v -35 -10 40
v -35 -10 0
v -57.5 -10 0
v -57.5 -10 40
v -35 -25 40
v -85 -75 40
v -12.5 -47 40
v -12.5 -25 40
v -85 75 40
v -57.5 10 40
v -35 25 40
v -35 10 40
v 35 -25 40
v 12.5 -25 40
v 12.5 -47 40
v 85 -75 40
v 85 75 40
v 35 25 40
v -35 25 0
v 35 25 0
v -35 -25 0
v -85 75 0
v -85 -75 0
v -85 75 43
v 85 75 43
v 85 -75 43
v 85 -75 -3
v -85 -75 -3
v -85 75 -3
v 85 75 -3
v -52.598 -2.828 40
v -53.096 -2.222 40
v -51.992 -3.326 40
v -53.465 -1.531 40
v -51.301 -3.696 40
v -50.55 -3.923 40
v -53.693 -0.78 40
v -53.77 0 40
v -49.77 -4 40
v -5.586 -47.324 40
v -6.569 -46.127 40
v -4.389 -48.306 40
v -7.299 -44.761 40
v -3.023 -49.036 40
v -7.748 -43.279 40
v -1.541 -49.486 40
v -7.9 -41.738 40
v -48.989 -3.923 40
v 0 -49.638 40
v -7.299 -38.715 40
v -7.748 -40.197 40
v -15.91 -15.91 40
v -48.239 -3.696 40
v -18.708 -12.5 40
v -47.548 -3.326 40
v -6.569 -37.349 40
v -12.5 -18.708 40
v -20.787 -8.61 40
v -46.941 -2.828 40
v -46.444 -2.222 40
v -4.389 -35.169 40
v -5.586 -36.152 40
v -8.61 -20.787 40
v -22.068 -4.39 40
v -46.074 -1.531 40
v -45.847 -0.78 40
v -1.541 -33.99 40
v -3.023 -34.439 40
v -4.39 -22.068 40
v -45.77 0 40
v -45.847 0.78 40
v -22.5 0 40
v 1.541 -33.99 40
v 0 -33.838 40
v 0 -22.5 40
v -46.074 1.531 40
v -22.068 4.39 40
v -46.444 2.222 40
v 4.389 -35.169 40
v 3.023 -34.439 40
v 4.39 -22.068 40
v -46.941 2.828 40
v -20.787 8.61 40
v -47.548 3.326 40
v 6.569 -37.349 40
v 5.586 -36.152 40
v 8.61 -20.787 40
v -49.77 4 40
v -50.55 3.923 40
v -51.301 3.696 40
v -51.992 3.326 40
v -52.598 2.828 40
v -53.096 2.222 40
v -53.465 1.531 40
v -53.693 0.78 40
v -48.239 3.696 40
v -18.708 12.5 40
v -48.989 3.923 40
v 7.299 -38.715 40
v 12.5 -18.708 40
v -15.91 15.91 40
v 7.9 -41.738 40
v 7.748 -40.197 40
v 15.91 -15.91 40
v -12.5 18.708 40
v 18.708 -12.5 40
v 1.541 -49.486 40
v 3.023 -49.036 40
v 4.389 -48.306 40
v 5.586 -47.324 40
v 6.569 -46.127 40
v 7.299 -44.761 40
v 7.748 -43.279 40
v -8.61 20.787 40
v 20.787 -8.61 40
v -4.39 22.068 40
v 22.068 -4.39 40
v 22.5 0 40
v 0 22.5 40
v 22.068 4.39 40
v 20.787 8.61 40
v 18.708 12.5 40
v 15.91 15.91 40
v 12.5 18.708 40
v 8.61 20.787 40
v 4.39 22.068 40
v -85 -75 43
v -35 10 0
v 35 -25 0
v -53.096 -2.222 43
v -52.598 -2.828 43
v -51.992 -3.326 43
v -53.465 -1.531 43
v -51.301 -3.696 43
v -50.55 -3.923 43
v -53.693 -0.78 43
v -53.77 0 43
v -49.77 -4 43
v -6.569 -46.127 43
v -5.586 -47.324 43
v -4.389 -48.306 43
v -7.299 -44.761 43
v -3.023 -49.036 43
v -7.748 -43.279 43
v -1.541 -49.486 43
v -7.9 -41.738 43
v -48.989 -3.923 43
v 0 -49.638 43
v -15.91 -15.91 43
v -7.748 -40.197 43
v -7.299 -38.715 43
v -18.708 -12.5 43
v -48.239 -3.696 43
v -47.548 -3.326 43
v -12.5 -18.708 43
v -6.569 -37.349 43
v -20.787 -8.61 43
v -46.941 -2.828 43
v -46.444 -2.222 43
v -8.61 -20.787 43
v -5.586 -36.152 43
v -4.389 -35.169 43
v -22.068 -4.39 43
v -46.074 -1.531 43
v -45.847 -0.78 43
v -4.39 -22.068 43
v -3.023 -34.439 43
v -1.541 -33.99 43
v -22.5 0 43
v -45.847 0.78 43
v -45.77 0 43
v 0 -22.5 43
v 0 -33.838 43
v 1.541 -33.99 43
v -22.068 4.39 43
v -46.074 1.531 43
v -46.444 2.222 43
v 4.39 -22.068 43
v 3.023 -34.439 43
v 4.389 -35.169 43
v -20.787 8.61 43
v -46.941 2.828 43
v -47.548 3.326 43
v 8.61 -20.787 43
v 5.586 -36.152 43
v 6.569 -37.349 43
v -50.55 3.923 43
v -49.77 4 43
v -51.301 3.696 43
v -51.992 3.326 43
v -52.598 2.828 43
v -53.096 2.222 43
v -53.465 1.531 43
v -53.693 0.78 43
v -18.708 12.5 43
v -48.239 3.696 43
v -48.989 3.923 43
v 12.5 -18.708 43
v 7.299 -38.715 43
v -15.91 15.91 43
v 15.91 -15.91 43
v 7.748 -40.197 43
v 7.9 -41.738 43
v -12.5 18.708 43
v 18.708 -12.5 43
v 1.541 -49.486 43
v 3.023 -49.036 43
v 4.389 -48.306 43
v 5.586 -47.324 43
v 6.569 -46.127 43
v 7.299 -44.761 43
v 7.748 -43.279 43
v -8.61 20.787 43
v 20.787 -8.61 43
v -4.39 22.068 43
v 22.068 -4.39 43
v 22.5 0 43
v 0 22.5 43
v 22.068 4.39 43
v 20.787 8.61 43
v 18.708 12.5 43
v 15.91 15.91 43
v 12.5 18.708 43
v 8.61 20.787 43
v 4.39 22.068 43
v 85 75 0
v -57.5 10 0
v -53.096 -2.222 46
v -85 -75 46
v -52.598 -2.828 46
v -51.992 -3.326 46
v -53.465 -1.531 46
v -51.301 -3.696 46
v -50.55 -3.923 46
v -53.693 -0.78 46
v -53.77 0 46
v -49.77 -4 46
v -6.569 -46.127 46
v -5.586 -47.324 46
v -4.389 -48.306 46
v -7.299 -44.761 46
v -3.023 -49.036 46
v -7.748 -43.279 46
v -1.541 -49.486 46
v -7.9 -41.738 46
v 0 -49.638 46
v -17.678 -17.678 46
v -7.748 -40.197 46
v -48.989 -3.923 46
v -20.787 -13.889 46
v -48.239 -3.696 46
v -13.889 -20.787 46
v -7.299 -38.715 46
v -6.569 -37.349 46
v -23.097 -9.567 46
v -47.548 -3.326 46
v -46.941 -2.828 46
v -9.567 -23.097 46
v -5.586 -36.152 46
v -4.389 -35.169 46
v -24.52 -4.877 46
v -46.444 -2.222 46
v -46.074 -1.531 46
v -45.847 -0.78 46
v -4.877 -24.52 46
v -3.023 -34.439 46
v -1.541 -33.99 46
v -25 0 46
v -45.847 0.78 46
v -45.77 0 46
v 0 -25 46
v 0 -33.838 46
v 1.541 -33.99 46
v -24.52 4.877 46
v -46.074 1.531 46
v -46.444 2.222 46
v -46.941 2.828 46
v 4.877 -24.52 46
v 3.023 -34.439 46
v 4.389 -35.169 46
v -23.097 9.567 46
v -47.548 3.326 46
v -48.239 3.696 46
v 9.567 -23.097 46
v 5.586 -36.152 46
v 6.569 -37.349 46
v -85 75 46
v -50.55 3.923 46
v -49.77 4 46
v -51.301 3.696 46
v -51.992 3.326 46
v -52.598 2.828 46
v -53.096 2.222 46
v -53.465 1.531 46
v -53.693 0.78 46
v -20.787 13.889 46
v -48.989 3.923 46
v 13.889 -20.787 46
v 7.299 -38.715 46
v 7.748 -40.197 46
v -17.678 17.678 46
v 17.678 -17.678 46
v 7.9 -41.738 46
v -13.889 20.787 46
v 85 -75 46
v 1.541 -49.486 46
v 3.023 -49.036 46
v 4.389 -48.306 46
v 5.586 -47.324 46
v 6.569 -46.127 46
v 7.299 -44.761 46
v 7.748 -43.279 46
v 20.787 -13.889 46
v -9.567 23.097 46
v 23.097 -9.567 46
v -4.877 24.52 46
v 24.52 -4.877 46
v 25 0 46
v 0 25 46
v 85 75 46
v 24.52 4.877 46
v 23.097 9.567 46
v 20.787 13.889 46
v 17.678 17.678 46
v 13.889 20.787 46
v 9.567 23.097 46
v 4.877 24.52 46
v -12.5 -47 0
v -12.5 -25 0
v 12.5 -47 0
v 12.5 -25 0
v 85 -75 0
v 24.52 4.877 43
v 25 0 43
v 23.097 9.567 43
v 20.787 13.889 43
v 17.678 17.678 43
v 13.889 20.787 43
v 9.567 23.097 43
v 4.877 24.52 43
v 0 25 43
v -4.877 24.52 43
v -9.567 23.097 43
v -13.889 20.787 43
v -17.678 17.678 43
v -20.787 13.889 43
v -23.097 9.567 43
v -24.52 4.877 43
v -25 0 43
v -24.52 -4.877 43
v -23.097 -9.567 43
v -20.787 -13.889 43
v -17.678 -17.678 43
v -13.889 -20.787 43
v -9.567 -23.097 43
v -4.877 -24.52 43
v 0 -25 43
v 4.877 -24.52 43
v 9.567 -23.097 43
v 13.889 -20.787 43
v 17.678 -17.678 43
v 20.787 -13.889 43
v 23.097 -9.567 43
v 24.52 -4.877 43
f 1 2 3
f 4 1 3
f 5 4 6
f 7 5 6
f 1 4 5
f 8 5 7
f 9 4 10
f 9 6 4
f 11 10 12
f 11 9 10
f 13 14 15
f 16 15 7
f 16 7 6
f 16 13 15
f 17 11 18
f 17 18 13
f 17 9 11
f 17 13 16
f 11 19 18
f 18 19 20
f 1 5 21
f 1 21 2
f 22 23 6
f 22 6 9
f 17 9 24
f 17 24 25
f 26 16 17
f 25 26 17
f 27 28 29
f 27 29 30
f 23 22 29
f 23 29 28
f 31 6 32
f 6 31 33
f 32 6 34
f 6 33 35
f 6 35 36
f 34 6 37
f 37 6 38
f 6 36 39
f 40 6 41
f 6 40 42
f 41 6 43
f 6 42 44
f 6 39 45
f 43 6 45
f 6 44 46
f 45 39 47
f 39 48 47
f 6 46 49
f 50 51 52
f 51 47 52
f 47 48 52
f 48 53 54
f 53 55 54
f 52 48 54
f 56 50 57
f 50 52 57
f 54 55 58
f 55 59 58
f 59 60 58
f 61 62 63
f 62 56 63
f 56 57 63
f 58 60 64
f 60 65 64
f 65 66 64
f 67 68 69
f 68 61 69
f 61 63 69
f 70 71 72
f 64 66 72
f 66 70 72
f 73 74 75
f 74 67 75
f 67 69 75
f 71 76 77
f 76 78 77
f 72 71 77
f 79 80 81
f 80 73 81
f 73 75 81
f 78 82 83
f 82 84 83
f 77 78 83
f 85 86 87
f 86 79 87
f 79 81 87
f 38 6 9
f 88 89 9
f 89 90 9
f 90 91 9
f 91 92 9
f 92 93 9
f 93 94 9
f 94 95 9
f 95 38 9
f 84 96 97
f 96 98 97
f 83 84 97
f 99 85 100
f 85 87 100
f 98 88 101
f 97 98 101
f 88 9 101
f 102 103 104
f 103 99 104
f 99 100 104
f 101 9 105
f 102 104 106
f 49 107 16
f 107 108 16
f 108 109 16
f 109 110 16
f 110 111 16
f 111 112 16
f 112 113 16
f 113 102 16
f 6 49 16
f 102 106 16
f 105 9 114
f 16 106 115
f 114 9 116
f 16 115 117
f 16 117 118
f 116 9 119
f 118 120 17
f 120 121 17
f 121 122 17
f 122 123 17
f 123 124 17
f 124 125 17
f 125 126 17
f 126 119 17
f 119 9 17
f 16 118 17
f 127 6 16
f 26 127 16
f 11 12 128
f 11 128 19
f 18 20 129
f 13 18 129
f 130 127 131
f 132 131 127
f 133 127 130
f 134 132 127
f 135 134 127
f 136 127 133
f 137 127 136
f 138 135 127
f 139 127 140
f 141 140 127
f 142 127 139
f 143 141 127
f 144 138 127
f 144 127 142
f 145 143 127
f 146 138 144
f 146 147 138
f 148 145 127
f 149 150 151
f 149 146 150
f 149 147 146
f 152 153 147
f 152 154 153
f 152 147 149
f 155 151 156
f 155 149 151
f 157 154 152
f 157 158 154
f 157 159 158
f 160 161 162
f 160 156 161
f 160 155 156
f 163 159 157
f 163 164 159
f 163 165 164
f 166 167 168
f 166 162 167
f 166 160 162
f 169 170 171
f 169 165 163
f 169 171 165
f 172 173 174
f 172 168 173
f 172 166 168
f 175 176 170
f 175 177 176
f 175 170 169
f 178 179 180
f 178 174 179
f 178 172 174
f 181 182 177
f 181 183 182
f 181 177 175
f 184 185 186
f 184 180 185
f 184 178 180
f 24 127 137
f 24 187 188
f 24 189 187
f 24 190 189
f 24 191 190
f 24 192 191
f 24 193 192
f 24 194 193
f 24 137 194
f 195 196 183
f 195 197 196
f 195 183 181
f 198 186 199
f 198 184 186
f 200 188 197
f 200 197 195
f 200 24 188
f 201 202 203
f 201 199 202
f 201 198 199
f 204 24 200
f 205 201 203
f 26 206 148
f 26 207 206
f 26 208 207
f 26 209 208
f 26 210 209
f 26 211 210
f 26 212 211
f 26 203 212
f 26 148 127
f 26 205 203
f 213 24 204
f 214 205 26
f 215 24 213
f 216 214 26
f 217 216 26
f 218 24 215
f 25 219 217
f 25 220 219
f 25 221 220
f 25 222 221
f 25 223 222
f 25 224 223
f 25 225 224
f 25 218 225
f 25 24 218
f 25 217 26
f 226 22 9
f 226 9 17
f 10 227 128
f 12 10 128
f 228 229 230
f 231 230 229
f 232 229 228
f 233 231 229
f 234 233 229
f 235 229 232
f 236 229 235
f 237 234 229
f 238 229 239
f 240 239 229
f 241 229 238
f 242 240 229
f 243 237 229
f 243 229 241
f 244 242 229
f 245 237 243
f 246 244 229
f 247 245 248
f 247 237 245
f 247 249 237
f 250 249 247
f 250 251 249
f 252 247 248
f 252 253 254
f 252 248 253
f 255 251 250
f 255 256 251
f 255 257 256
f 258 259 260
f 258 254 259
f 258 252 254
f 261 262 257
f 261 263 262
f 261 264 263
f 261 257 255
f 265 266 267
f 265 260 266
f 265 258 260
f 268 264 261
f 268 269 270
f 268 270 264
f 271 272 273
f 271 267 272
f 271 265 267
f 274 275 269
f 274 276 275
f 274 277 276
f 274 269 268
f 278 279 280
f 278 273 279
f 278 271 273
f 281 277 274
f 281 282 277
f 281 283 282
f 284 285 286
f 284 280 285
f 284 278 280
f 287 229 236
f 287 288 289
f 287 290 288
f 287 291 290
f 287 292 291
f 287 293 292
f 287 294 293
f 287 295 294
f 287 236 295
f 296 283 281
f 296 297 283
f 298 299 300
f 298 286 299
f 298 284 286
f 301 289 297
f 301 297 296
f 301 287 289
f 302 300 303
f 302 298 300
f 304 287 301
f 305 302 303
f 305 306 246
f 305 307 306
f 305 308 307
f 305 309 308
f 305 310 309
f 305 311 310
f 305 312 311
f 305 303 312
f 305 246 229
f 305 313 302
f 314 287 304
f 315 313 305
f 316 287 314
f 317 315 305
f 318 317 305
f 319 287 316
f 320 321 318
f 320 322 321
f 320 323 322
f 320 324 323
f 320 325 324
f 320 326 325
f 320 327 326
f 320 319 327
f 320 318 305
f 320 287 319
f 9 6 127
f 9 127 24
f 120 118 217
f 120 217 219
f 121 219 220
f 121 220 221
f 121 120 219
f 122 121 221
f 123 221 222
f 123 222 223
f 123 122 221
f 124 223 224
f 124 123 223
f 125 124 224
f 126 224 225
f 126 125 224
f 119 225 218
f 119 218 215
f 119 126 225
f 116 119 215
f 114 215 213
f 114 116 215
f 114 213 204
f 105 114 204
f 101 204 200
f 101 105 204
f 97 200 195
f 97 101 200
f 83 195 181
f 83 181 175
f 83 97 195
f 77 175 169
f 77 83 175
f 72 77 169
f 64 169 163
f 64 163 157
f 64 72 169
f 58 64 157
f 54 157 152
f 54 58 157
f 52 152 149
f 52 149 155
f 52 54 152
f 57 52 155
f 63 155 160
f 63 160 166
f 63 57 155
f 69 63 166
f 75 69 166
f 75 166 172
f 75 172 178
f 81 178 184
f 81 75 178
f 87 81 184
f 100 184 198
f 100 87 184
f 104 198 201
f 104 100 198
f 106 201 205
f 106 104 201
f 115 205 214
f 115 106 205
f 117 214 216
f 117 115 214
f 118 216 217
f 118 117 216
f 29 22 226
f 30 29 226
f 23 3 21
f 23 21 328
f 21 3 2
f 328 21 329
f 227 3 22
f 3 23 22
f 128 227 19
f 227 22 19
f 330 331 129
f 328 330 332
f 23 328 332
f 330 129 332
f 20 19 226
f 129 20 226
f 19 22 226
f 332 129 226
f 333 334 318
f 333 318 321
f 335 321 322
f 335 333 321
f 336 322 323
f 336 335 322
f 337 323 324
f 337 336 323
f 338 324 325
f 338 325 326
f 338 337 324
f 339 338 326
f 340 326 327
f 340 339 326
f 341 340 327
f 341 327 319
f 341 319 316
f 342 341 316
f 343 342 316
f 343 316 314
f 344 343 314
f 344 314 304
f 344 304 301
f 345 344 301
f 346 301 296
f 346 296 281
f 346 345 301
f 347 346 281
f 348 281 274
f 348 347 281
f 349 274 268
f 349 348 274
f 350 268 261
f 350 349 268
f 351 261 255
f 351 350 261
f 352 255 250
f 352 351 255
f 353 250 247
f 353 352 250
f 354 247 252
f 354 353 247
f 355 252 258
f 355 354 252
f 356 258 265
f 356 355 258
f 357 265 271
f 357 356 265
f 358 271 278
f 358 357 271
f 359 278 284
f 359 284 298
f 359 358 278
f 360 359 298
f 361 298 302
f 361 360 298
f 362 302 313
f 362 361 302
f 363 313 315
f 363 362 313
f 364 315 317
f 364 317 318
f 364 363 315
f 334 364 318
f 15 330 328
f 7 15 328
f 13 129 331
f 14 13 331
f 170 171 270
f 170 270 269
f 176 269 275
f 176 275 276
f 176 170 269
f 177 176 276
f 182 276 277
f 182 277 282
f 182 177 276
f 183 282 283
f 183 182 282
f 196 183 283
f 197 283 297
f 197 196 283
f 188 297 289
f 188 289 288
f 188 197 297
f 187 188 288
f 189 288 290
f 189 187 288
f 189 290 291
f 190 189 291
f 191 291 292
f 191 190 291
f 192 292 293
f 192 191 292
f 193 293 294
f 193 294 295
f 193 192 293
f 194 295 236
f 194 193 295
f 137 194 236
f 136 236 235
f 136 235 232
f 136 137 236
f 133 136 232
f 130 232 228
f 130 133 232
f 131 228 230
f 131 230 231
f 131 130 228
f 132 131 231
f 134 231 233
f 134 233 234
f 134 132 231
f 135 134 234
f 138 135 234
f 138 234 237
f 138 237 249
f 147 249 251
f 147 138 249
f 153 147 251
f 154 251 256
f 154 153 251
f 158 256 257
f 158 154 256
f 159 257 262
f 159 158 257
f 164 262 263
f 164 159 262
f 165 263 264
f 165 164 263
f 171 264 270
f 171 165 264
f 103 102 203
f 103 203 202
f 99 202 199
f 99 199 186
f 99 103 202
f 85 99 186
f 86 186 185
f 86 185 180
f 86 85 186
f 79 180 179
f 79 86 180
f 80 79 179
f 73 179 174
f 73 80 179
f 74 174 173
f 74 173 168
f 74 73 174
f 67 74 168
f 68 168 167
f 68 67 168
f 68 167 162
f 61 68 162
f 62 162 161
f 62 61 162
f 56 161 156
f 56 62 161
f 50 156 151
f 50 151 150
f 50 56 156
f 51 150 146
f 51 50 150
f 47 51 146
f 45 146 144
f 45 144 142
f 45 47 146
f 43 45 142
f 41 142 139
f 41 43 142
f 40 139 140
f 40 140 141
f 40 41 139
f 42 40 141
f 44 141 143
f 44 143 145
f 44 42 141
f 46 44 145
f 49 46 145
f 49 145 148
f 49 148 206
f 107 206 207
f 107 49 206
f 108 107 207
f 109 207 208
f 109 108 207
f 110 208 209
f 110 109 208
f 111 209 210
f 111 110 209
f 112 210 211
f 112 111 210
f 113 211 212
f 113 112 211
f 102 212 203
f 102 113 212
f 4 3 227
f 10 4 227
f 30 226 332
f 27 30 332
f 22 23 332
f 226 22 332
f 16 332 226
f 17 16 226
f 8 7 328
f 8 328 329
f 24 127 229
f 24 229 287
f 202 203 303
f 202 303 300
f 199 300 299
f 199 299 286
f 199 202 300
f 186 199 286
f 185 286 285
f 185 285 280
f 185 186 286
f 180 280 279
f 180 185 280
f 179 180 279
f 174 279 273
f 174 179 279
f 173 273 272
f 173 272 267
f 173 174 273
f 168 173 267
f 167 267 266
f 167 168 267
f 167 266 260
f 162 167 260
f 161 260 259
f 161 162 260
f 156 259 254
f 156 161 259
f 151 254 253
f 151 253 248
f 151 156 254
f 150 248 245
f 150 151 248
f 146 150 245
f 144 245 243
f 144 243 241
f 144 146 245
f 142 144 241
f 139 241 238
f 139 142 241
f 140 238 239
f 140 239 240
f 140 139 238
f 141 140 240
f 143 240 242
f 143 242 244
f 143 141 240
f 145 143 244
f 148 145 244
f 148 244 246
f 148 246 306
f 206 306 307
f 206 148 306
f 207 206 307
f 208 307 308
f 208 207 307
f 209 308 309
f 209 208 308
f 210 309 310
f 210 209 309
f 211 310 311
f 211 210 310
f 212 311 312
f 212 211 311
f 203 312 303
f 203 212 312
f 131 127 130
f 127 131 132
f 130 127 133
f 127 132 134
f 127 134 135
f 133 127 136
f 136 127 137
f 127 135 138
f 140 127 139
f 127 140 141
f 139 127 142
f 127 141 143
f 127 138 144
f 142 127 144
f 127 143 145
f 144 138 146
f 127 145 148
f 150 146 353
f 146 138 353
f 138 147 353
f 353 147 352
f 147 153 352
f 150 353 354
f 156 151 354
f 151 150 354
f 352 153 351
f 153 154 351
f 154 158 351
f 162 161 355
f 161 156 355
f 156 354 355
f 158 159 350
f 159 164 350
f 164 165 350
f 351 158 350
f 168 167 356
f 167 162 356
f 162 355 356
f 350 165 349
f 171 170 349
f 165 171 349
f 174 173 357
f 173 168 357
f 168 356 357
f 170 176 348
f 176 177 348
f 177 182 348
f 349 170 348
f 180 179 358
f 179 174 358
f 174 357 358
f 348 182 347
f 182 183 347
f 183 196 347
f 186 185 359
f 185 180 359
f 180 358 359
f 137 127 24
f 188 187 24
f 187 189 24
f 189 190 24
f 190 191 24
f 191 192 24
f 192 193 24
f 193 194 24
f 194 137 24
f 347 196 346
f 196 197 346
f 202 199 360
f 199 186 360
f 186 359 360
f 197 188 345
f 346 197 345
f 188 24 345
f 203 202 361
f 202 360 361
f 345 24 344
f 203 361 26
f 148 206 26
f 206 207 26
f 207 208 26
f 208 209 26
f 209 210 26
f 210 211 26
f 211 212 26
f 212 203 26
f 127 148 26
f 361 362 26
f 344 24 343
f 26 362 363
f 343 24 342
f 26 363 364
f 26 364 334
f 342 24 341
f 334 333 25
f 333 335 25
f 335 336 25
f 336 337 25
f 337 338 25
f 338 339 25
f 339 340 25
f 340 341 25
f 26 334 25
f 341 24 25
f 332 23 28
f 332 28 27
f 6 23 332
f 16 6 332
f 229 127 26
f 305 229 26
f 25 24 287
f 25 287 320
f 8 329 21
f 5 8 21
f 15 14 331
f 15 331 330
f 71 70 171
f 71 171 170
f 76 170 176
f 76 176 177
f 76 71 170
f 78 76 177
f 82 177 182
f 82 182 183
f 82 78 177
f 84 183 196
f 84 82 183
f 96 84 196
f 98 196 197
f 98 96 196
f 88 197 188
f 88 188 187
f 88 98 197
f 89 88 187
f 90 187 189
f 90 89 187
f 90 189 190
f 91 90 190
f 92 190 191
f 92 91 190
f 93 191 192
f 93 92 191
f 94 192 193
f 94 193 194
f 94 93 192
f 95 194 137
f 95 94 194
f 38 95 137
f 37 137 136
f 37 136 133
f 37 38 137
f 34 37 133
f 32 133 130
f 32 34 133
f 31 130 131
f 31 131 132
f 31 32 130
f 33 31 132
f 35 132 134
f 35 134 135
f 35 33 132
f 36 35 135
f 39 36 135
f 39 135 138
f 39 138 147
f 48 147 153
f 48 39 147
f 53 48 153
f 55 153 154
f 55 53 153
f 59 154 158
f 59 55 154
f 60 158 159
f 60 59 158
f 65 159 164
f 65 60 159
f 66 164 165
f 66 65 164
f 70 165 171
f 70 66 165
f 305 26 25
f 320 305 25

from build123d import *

# Parameters (mm, degrees)
F0_W     = 170
F0_H     = 150
F1_DEPTH = 40
F2_W     = 170
F2_H     = 150
F3_DEPTH = 3
F4_W     = 170
F4_H     = 150
F4_R     = 7.9
F4_R_2   = 4
F4_R_3   = 22.5
F5_DEPTH = 3
F6_W     = 170
F6_H     = 150
F6_R     = 7.9
F6_R_2   = 4
F6_R_3   = 25
F7_DEPTH = 3


with BuildPart() as f1:
    # F0 (on Top) → F1 (new body)
    with BuildSketch(Plane.XY):
        Rectangle(F0_W, F0_H)
        Polygon((-35, 25), (35, 25), (35, -25), (12.5, -25), (12.5, -47), (-12.5, -47), (-12.5, -25), (-35, -25), (-35, -10), (-57.5, -10), (-57.5, 10), (-35, 10), align=None, mode=Mode.SUBTRACT)
    extrude(amount=F1_DEPTH)


with BuildPart() as f3:
    # F2 (on face) → F3 (new body)
    with BuildSketch(Plane(origin=(0, 0, 0), x_dir=(1, 0, 0), z_dir=(0, 0, -1))):
        Rectangle(F2_W, F2_H)
    extrude(amount=F3_DEPTH)


with BuildPart() as f5:
    # F4 (on face) → F5 (new body)
    with BuildSketch(Plane.XY.offset(40)):
        Rectangle(F4_W, F4_H)
        with Locations((0, -41.737828)):
            Circle(F4_R, mode=Mode.SUBTRACT)
        with Locations((-49.769852, 0)):
            Circle(F4_R_2, mode=Mode.SUBTRACT)
        Circle(F4_R_3, mode=Mode.SUBTRACT)
    extrude(amount=F5_DEPTH)


with BuildPart() as f7:
    # F6 (on face) → F7 (new body)
    with BuildSketch(Plane.XY.offset(43)):
        Rectangle(F6_W, F6_H)
        with Locations((0, -41.737828)):
            Circle(F6_R, mode=Mode.SUBTRACT)
        with Locations((-49.769852, 0)):
            Circle(F6_R_2, mode=Mode.SUBTRACT)
        Circle(F6_R_3, mode=Mode.SUBTRACT)
    extrude(amount=F7_DEPTH)


solid = Compound([f1.part, f3.part, f5.part, f7.part])
